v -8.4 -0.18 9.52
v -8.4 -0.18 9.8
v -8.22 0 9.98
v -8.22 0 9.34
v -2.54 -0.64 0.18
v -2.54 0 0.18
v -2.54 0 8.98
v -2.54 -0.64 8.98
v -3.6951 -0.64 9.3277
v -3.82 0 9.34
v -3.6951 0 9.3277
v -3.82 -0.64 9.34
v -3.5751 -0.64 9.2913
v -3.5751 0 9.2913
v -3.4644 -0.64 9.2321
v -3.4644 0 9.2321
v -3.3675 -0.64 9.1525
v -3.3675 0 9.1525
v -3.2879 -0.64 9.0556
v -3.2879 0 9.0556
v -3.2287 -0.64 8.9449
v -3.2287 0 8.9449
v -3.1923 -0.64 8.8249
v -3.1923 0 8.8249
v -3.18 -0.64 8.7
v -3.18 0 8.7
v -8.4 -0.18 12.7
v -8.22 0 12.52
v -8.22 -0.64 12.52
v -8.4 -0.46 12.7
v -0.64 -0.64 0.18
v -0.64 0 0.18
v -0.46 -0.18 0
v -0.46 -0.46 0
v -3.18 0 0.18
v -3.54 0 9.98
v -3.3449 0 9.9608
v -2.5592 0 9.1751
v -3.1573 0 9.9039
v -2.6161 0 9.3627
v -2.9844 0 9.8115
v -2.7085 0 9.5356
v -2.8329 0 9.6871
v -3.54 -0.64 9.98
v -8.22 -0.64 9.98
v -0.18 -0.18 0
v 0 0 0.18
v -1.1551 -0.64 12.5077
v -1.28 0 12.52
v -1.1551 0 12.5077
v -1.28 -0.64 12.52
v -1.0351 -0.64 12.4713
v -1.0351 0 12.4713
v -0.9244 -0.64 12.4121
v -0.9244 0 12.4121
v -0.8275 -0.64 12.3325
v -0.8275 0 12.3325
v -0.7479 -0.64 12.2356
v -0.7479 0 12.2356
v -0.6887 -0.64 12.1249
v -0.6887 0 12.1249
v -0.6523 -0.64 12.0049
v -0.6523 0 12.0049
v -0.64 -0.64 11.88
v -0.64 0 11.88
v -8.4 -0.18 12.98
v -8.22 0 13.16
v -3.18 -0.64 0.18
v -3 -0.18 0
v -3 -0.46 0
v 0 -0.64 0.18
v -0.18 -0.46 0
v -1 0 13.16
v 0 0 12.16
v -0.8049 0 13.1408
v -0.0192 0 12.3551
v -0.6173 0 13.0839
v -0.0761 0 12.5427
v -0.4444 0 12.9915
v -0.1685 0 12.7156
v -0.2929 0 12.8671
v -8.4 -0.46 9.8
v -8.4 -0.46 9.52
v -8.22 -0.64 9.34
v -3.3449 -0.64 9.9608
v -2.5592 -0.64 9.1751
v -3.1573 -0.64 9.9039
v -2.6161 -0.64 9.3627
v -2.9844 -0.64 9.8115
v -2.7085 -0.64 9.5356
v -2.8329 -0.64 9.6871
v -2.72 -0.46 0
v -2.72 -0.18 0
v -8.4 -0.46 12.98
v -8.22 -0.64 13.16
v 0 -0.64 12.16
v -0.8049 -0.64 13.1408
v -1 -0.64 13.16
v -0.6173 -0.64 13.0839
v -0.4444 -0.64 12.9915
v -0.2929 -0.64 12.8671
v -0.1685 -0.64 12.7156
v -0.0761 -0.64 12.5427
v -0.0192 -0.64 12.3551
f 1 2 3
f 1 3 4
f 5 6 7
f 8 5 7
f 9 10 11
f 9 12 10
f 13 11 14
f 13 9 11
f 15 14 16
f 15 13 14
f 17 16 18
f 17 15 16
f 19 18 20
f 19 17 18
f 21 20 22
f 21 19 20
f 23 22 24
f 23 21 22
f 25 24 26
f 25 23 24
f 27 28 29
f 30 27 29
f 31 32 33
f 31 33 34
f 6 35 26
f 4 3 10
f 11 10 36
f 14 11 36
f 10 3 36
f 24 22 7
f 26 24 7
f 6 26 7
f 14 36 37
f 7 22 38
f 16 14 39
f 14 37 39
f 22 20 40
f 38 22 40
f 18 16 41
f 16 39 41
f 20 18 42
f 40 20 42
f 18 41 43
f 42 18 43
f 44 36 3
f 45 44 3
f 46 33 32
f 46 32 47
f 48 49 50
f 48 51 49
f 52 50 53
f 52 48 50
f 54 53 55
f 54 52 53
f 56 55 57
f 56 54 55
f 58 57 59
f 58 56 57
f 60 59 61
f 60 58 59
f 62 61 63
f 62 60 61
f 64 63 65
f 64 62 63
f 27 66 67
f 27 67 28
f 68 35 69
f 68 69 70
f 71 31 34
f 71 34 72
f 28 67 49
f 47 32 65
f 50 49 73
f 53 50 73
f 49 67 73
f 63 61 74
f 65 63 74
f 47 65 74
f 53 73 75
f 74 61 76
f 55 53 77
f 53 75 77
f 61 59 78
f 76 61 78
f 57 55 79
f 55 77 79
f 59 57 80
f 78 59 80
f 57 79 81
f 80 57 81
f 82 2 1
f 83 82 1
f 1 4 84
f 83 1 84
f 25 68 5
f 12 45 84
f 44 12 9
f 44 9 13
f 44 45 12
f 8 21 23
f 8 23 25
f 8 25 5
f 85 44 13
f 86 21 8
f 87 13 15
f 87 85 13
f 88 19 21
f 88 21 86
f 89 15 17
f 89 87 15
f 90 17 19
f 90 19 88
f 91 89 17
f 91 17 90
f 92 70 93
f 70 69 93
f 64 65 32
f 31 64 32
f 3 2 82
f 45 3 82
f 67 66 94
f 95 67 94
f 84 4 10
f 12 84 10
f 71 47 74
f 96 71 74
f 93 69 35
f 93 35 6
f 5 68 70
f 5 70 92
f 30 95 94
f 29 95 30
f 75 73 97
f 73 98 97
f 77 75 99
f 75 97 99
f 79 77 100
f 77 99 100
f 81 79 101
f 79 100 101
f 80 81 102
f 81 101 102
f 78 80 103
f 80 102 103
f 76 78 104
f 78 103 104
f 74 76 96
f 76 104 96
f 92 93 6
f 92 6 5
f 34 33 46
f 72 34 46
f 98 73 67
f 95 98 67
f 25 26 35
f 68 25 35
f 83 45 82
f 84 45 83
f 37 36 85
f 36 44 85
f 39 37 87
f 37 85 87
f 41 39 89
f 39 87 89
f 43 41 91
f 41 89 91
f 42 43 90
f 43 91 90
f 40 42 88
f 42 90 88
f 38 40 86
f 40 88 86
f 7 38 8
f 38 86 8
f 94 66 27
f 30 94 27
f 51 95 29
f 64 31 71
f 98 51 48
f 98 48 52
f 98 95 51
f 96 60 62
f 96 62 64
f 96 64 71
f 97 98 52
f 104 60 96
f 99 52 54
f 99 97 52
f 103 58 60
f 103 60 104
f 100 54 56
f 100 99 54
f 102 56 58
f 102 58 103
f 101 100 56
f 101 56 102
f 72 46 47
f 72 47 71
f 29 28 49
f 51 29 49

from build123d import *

# Parameters (mm, degrees)
PAD_DEPTH       = 0.64
FILLET_R        = 0.64
FILLET001_R     = 1
CHAMFER002_SIZE = 0.18


with BuildPart() as part:
    # Sketch → Pad (new body)
    with BuildSketch(Plane.XZ):
        Polygon((0, 0), (0, 13.16), (-8.4, 13.16), (-8.4, 12.52), (-0.64, 12.52), (-0.64, 0), align=None)
        Polygon((-2.54, 0), (-2.54, 9.98), (-8.4, 9.98), (-8.4, 9.34), (-3.18, 9.34), (-3.18, 0), align=None)
    extrude(amount=PAD_DEPTH)

    # Fillet
    fillet_edges = [part.edges().sort_by_distance(p)[0] for p in [
        (-3.18, -0.32, 9.34),
        (-0.64, -0.32, 12.52),
    ]]
    fillet(fillet_edges, radius=FILLET_R)

    # Fillet001
    fillet001_edges = [part.edges().sort_by_distance(p)[0] for p in [
        (-2.54, -0.32, 9.98),
        (0, -0.32, 13.16),
    ]]
    fillet(fillet001_edges, radius=FILLET001_R)

    # Chamfer002
    chamfer002_edges = [part.edges().sort_by_distance(p)[0] for p in [
        (-8.4, 0, 12.84),
        (-8.4, -0.32, 13.16),
        (-8.4, -0.64, 12.84),
        (-8.4, -0.32, 12.52),
        (-8.4, 0, 9.66),
        (-8.4, -0.64, 9.66),
        (-8.4, -0.32, 9.98),
        (-8.4, -0.32, 9.34),
        (0, -0.32, 0),
        (-0.64, -0.32, 0),
        (-0.32, 0, 0),
        (-0.32, -0.64, 0),
        (-2.86, -0.64, 0),
        (-3.18, -0.32, 0),
        (-2.54, -0.32, 0),
        (-2.86, 0, 0),
    ]]
    chamfer(chamfer002_edges, length=CHAMFER002_SIZE)


solid = part.part
